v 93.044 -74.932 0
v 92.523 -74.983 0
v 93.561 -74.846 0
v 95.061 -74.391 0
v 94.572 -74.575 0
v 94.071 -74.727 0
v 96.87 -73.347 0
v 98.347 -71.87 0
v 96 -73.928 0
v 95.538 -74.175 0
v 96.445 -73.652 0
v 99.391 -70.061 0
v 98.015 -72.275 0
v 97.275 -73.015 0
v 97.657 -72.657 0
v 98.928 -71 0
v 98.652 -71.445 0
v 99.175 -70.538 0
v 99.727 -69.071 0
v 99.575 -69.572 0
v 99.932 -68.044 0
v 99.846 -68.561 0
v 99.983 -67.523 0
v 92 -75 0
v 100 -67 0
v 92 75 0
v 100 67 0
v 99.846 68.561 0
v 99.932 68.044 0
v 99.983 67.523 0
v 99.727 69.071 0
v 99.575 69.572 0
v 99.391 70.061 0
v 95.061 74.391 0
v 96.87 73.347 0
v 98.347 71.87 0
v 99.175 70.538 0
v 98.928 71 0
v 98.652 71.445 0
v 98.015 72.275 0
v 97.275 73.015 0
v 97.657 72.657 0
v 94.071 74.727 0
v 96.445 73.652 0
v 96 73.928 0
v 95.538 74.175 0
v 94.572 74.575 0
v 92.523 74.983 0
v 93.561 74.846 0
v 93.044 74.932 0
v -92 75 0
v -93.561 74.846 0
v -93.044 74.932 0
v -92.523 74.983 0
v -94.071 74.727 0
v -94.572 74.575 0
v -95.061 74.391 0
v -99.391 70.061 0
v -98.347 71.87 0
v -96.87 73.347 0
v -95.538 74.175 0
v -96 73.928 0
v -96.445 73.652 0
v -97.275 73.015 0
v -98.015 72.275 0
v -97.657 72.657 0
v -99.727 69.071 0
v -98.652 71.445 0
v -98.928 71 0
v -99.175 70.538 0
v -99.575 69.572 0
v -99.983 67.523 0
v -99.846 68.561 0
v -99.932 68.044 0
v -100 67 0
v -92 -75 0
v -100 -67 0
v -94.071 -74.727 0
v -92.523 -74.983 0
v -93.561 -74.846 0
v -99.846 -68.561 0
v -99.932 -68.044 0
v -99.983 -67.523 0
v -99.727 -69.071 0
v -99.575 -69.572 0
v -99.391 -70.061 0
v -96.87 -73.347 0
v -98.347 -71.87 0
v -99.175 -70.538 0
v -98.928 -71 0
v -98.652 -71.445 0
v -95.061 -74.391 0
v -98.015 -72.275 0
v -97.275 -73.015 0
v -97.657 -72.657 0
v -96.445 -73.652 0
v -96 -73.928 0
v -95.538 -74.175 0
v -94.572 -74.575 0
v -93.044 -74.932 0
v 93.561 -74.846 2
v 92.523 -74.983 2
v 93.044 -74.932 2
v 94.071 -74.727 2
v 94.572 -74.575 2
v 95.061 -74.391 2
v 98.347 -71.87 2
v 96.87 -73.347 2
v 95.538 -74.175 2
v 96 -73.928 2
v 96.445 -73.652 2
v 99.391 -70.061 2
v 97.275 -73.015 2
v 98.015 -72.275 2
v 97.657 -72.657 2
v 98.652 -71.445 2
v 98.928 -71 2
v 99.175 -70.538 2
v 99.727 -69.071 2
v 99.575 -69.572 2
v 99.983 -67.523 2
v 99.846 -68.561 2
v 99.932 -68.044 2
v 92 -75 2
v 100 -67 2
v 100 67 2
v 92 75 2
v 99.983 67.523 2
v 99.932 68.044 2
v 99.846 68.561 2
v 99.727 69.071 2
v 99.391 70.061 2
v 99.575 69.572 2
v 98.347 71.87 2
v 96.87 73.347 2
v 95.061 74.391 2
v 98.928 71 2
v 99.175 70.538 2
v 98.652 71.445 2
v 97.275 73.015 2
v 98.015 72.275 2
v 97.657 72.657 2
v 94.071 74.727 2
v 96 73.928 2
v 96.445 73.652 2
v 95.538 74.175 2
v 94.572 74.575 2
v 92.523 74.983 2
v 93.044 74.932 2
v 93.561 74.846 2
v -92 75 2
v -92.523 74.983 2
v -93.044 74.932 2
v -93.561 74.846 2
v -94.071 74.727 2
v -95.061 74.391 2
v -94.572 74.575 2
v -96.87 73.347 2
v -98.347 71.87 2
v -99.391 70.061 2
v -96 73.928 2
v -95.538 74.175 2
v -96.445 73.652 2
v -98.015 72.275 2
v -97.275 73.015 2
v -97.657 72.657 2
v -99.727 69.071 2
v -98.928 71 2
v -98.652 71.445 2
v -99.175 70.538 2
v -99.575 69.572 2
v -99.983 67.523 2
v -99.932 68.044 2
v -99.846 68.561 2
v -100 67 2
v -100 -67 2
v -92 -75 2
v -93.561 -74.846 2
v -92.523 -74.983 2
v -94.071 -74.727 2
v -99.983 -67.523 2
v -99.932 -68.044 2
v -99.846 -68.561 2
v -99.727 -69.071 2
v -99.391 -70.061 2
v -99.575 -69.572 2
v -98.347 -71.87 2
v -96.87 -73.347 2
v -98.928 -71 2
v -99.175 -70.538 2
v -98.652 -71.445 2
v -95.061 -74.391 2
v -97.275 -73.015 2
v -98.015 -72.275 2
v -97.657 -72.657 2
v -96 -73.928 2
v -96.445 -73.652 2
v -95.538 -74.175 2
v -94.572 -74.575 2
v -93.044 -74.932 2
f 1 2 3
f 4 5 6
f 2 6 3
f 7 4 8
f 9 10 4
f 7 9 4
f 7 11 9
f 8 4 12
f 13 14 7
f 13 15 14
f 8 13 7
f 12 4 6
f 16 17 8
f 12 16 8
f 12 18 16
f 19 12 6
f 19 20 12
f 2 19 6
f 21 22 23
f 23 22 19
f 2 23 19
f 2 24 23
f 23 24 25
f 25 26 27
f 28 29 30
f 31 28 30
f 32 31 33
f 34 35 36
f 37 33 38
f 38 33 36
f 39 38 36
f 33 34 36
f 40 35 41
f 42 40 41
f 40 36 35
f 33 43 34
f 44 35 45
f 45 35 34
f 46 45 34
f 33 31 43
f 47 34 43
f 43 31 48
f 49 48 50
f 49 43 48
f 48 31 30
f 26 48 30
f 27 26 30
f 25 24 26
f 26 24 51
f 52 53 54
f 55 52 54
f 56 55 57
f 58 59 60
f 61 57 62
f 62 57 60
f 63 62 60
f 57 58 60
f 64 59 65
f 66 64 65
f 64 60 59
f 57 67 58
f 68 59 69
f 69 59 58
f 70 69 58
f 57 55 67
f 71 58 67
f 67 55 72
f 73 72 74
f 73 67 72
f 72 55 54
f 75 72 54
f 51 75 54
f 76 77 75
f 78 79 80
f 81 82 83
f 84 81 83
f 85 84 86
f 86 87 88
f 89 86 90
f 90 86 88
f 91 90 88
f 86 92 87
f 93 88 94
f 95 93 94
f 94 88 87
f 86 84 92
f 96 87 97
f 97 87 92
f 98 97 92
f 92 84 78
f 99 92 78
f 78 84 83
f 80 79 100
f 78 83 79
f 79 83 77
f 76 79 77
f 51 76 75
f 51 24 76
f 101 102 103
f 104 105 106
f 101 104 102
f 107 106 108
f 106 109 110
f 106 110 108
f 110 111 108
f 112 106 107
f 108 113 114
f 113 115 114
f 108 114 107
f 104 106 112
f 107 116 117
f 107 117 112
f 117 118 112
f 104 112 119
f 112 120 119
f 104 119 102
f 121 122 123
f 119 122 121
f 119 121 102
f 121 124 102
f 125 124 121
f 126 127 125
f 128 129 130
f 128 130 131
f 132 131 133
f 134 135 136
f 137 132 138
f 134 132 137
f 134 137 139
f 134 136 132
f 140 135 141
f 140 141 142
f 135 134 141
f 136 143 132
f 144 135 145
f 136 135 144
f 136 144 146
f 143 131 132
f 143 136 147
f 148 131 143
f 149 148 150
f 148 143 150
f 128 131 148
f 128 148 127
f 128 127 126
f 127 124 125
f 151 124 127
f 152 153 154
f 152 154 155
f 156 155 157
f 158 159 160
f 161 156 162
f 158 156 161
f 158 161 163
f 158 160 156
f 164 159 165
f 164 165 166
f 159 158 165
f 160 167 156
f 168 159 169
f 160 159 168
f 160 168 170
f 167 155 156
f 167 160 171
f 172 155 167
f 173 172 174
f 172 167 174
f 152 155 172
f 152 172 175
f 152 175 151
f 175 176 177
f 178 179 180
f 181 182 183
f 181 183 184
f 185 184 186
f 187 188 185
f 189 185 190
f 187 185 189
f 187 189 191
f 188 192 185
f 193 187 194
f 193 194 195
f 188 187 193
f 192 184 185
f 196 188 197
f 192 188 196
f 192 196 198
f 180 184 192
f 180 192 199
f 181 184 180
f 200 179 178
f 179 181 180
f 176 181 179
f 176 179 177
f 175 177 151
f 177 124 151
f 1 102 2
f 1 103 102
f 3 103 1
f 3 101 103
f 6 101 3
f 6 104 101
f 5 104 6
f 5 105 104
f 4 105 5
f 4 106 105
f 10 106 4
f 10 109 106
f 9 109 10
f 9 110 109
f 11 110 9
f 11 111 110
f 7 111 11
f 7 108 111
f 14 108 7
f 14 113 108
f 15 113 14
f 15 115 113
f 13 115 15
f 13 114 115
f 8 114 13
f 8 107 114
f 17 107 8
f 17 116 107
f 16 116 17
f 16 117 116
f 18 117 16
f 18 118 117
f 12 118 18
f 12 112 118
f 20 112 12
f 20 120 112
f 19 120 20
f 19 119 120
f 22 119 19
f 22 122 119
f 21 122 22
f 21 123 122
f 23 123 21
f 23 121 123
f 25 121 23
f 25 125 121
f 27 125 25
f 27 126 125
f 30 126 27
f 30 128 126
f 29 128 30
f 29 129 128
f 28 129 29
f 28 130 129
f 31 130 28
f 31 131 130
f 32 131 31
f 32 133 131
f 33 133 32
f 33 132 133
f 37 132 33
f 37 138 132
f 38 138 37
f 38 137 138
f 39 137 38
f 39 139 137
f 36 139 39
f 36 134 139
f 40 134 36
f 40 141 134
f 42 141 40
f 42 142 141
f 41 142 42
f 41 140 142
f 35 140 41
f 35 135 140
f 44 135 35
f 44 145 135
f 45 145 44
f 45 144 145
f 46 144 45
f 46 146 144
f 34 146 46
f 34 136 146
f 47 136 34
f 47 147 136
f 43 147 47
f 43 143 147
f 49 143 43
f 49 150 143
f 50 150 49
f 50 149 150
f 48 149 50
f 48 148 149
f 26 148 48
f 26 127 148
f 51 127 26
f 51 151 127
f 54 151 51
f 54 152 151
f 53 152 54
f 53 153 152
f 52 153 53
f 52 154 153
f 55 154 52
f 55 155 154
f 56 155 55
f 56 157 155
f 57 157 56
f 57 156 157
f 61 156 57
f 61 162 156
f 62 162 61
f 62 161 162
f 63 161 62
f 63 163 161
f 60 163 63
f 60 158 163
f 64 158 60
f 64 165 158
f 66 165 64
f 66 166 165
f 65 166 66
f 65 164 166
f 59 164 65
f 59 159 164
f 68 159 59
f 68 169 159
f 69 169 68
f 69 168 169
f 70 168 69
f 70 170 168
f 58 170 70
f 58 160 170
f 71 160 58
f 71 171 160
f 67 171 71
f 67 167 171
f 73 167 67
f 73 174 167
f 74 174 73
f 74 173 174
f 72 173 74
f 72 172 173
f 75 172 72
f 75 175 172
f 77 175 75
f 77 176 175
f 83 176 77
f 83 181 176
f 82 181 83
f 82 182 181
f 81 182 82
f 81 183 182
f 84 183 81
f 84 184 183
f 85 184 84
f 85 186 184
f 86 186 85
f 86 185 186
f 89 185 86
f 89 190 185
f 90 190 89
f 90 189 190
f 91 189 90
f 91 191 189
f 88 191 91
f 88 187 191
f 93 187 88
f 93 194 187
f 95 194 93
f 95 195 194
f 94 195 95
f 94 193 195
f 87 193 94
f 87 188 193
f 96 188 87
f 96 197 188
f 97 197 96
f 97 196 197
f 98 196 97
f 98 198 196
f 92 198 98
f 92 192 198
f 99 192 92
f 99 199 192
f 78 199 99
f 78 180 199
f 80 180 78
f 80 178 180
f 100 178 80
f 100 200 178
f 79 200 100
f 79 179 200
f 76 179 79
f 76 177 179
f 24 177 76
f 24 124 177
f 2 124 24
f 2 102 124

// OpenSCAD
$fn = 96;

length = 200;
width  = 150;
thickness = 2;

corner_radius = 8;

module rounded_sheet(l, w, t, r){
    r2 = min(r, min(l, w)/2);
    linear_extrude(height = t)
        offset(r = r2)
            square([l - 2*r2, w - 2*r2], center = true);
}

color([0.85, 0.85, 0.90, 0.55])
    rounded_sheet(length, width, thickness, corner_radius);
